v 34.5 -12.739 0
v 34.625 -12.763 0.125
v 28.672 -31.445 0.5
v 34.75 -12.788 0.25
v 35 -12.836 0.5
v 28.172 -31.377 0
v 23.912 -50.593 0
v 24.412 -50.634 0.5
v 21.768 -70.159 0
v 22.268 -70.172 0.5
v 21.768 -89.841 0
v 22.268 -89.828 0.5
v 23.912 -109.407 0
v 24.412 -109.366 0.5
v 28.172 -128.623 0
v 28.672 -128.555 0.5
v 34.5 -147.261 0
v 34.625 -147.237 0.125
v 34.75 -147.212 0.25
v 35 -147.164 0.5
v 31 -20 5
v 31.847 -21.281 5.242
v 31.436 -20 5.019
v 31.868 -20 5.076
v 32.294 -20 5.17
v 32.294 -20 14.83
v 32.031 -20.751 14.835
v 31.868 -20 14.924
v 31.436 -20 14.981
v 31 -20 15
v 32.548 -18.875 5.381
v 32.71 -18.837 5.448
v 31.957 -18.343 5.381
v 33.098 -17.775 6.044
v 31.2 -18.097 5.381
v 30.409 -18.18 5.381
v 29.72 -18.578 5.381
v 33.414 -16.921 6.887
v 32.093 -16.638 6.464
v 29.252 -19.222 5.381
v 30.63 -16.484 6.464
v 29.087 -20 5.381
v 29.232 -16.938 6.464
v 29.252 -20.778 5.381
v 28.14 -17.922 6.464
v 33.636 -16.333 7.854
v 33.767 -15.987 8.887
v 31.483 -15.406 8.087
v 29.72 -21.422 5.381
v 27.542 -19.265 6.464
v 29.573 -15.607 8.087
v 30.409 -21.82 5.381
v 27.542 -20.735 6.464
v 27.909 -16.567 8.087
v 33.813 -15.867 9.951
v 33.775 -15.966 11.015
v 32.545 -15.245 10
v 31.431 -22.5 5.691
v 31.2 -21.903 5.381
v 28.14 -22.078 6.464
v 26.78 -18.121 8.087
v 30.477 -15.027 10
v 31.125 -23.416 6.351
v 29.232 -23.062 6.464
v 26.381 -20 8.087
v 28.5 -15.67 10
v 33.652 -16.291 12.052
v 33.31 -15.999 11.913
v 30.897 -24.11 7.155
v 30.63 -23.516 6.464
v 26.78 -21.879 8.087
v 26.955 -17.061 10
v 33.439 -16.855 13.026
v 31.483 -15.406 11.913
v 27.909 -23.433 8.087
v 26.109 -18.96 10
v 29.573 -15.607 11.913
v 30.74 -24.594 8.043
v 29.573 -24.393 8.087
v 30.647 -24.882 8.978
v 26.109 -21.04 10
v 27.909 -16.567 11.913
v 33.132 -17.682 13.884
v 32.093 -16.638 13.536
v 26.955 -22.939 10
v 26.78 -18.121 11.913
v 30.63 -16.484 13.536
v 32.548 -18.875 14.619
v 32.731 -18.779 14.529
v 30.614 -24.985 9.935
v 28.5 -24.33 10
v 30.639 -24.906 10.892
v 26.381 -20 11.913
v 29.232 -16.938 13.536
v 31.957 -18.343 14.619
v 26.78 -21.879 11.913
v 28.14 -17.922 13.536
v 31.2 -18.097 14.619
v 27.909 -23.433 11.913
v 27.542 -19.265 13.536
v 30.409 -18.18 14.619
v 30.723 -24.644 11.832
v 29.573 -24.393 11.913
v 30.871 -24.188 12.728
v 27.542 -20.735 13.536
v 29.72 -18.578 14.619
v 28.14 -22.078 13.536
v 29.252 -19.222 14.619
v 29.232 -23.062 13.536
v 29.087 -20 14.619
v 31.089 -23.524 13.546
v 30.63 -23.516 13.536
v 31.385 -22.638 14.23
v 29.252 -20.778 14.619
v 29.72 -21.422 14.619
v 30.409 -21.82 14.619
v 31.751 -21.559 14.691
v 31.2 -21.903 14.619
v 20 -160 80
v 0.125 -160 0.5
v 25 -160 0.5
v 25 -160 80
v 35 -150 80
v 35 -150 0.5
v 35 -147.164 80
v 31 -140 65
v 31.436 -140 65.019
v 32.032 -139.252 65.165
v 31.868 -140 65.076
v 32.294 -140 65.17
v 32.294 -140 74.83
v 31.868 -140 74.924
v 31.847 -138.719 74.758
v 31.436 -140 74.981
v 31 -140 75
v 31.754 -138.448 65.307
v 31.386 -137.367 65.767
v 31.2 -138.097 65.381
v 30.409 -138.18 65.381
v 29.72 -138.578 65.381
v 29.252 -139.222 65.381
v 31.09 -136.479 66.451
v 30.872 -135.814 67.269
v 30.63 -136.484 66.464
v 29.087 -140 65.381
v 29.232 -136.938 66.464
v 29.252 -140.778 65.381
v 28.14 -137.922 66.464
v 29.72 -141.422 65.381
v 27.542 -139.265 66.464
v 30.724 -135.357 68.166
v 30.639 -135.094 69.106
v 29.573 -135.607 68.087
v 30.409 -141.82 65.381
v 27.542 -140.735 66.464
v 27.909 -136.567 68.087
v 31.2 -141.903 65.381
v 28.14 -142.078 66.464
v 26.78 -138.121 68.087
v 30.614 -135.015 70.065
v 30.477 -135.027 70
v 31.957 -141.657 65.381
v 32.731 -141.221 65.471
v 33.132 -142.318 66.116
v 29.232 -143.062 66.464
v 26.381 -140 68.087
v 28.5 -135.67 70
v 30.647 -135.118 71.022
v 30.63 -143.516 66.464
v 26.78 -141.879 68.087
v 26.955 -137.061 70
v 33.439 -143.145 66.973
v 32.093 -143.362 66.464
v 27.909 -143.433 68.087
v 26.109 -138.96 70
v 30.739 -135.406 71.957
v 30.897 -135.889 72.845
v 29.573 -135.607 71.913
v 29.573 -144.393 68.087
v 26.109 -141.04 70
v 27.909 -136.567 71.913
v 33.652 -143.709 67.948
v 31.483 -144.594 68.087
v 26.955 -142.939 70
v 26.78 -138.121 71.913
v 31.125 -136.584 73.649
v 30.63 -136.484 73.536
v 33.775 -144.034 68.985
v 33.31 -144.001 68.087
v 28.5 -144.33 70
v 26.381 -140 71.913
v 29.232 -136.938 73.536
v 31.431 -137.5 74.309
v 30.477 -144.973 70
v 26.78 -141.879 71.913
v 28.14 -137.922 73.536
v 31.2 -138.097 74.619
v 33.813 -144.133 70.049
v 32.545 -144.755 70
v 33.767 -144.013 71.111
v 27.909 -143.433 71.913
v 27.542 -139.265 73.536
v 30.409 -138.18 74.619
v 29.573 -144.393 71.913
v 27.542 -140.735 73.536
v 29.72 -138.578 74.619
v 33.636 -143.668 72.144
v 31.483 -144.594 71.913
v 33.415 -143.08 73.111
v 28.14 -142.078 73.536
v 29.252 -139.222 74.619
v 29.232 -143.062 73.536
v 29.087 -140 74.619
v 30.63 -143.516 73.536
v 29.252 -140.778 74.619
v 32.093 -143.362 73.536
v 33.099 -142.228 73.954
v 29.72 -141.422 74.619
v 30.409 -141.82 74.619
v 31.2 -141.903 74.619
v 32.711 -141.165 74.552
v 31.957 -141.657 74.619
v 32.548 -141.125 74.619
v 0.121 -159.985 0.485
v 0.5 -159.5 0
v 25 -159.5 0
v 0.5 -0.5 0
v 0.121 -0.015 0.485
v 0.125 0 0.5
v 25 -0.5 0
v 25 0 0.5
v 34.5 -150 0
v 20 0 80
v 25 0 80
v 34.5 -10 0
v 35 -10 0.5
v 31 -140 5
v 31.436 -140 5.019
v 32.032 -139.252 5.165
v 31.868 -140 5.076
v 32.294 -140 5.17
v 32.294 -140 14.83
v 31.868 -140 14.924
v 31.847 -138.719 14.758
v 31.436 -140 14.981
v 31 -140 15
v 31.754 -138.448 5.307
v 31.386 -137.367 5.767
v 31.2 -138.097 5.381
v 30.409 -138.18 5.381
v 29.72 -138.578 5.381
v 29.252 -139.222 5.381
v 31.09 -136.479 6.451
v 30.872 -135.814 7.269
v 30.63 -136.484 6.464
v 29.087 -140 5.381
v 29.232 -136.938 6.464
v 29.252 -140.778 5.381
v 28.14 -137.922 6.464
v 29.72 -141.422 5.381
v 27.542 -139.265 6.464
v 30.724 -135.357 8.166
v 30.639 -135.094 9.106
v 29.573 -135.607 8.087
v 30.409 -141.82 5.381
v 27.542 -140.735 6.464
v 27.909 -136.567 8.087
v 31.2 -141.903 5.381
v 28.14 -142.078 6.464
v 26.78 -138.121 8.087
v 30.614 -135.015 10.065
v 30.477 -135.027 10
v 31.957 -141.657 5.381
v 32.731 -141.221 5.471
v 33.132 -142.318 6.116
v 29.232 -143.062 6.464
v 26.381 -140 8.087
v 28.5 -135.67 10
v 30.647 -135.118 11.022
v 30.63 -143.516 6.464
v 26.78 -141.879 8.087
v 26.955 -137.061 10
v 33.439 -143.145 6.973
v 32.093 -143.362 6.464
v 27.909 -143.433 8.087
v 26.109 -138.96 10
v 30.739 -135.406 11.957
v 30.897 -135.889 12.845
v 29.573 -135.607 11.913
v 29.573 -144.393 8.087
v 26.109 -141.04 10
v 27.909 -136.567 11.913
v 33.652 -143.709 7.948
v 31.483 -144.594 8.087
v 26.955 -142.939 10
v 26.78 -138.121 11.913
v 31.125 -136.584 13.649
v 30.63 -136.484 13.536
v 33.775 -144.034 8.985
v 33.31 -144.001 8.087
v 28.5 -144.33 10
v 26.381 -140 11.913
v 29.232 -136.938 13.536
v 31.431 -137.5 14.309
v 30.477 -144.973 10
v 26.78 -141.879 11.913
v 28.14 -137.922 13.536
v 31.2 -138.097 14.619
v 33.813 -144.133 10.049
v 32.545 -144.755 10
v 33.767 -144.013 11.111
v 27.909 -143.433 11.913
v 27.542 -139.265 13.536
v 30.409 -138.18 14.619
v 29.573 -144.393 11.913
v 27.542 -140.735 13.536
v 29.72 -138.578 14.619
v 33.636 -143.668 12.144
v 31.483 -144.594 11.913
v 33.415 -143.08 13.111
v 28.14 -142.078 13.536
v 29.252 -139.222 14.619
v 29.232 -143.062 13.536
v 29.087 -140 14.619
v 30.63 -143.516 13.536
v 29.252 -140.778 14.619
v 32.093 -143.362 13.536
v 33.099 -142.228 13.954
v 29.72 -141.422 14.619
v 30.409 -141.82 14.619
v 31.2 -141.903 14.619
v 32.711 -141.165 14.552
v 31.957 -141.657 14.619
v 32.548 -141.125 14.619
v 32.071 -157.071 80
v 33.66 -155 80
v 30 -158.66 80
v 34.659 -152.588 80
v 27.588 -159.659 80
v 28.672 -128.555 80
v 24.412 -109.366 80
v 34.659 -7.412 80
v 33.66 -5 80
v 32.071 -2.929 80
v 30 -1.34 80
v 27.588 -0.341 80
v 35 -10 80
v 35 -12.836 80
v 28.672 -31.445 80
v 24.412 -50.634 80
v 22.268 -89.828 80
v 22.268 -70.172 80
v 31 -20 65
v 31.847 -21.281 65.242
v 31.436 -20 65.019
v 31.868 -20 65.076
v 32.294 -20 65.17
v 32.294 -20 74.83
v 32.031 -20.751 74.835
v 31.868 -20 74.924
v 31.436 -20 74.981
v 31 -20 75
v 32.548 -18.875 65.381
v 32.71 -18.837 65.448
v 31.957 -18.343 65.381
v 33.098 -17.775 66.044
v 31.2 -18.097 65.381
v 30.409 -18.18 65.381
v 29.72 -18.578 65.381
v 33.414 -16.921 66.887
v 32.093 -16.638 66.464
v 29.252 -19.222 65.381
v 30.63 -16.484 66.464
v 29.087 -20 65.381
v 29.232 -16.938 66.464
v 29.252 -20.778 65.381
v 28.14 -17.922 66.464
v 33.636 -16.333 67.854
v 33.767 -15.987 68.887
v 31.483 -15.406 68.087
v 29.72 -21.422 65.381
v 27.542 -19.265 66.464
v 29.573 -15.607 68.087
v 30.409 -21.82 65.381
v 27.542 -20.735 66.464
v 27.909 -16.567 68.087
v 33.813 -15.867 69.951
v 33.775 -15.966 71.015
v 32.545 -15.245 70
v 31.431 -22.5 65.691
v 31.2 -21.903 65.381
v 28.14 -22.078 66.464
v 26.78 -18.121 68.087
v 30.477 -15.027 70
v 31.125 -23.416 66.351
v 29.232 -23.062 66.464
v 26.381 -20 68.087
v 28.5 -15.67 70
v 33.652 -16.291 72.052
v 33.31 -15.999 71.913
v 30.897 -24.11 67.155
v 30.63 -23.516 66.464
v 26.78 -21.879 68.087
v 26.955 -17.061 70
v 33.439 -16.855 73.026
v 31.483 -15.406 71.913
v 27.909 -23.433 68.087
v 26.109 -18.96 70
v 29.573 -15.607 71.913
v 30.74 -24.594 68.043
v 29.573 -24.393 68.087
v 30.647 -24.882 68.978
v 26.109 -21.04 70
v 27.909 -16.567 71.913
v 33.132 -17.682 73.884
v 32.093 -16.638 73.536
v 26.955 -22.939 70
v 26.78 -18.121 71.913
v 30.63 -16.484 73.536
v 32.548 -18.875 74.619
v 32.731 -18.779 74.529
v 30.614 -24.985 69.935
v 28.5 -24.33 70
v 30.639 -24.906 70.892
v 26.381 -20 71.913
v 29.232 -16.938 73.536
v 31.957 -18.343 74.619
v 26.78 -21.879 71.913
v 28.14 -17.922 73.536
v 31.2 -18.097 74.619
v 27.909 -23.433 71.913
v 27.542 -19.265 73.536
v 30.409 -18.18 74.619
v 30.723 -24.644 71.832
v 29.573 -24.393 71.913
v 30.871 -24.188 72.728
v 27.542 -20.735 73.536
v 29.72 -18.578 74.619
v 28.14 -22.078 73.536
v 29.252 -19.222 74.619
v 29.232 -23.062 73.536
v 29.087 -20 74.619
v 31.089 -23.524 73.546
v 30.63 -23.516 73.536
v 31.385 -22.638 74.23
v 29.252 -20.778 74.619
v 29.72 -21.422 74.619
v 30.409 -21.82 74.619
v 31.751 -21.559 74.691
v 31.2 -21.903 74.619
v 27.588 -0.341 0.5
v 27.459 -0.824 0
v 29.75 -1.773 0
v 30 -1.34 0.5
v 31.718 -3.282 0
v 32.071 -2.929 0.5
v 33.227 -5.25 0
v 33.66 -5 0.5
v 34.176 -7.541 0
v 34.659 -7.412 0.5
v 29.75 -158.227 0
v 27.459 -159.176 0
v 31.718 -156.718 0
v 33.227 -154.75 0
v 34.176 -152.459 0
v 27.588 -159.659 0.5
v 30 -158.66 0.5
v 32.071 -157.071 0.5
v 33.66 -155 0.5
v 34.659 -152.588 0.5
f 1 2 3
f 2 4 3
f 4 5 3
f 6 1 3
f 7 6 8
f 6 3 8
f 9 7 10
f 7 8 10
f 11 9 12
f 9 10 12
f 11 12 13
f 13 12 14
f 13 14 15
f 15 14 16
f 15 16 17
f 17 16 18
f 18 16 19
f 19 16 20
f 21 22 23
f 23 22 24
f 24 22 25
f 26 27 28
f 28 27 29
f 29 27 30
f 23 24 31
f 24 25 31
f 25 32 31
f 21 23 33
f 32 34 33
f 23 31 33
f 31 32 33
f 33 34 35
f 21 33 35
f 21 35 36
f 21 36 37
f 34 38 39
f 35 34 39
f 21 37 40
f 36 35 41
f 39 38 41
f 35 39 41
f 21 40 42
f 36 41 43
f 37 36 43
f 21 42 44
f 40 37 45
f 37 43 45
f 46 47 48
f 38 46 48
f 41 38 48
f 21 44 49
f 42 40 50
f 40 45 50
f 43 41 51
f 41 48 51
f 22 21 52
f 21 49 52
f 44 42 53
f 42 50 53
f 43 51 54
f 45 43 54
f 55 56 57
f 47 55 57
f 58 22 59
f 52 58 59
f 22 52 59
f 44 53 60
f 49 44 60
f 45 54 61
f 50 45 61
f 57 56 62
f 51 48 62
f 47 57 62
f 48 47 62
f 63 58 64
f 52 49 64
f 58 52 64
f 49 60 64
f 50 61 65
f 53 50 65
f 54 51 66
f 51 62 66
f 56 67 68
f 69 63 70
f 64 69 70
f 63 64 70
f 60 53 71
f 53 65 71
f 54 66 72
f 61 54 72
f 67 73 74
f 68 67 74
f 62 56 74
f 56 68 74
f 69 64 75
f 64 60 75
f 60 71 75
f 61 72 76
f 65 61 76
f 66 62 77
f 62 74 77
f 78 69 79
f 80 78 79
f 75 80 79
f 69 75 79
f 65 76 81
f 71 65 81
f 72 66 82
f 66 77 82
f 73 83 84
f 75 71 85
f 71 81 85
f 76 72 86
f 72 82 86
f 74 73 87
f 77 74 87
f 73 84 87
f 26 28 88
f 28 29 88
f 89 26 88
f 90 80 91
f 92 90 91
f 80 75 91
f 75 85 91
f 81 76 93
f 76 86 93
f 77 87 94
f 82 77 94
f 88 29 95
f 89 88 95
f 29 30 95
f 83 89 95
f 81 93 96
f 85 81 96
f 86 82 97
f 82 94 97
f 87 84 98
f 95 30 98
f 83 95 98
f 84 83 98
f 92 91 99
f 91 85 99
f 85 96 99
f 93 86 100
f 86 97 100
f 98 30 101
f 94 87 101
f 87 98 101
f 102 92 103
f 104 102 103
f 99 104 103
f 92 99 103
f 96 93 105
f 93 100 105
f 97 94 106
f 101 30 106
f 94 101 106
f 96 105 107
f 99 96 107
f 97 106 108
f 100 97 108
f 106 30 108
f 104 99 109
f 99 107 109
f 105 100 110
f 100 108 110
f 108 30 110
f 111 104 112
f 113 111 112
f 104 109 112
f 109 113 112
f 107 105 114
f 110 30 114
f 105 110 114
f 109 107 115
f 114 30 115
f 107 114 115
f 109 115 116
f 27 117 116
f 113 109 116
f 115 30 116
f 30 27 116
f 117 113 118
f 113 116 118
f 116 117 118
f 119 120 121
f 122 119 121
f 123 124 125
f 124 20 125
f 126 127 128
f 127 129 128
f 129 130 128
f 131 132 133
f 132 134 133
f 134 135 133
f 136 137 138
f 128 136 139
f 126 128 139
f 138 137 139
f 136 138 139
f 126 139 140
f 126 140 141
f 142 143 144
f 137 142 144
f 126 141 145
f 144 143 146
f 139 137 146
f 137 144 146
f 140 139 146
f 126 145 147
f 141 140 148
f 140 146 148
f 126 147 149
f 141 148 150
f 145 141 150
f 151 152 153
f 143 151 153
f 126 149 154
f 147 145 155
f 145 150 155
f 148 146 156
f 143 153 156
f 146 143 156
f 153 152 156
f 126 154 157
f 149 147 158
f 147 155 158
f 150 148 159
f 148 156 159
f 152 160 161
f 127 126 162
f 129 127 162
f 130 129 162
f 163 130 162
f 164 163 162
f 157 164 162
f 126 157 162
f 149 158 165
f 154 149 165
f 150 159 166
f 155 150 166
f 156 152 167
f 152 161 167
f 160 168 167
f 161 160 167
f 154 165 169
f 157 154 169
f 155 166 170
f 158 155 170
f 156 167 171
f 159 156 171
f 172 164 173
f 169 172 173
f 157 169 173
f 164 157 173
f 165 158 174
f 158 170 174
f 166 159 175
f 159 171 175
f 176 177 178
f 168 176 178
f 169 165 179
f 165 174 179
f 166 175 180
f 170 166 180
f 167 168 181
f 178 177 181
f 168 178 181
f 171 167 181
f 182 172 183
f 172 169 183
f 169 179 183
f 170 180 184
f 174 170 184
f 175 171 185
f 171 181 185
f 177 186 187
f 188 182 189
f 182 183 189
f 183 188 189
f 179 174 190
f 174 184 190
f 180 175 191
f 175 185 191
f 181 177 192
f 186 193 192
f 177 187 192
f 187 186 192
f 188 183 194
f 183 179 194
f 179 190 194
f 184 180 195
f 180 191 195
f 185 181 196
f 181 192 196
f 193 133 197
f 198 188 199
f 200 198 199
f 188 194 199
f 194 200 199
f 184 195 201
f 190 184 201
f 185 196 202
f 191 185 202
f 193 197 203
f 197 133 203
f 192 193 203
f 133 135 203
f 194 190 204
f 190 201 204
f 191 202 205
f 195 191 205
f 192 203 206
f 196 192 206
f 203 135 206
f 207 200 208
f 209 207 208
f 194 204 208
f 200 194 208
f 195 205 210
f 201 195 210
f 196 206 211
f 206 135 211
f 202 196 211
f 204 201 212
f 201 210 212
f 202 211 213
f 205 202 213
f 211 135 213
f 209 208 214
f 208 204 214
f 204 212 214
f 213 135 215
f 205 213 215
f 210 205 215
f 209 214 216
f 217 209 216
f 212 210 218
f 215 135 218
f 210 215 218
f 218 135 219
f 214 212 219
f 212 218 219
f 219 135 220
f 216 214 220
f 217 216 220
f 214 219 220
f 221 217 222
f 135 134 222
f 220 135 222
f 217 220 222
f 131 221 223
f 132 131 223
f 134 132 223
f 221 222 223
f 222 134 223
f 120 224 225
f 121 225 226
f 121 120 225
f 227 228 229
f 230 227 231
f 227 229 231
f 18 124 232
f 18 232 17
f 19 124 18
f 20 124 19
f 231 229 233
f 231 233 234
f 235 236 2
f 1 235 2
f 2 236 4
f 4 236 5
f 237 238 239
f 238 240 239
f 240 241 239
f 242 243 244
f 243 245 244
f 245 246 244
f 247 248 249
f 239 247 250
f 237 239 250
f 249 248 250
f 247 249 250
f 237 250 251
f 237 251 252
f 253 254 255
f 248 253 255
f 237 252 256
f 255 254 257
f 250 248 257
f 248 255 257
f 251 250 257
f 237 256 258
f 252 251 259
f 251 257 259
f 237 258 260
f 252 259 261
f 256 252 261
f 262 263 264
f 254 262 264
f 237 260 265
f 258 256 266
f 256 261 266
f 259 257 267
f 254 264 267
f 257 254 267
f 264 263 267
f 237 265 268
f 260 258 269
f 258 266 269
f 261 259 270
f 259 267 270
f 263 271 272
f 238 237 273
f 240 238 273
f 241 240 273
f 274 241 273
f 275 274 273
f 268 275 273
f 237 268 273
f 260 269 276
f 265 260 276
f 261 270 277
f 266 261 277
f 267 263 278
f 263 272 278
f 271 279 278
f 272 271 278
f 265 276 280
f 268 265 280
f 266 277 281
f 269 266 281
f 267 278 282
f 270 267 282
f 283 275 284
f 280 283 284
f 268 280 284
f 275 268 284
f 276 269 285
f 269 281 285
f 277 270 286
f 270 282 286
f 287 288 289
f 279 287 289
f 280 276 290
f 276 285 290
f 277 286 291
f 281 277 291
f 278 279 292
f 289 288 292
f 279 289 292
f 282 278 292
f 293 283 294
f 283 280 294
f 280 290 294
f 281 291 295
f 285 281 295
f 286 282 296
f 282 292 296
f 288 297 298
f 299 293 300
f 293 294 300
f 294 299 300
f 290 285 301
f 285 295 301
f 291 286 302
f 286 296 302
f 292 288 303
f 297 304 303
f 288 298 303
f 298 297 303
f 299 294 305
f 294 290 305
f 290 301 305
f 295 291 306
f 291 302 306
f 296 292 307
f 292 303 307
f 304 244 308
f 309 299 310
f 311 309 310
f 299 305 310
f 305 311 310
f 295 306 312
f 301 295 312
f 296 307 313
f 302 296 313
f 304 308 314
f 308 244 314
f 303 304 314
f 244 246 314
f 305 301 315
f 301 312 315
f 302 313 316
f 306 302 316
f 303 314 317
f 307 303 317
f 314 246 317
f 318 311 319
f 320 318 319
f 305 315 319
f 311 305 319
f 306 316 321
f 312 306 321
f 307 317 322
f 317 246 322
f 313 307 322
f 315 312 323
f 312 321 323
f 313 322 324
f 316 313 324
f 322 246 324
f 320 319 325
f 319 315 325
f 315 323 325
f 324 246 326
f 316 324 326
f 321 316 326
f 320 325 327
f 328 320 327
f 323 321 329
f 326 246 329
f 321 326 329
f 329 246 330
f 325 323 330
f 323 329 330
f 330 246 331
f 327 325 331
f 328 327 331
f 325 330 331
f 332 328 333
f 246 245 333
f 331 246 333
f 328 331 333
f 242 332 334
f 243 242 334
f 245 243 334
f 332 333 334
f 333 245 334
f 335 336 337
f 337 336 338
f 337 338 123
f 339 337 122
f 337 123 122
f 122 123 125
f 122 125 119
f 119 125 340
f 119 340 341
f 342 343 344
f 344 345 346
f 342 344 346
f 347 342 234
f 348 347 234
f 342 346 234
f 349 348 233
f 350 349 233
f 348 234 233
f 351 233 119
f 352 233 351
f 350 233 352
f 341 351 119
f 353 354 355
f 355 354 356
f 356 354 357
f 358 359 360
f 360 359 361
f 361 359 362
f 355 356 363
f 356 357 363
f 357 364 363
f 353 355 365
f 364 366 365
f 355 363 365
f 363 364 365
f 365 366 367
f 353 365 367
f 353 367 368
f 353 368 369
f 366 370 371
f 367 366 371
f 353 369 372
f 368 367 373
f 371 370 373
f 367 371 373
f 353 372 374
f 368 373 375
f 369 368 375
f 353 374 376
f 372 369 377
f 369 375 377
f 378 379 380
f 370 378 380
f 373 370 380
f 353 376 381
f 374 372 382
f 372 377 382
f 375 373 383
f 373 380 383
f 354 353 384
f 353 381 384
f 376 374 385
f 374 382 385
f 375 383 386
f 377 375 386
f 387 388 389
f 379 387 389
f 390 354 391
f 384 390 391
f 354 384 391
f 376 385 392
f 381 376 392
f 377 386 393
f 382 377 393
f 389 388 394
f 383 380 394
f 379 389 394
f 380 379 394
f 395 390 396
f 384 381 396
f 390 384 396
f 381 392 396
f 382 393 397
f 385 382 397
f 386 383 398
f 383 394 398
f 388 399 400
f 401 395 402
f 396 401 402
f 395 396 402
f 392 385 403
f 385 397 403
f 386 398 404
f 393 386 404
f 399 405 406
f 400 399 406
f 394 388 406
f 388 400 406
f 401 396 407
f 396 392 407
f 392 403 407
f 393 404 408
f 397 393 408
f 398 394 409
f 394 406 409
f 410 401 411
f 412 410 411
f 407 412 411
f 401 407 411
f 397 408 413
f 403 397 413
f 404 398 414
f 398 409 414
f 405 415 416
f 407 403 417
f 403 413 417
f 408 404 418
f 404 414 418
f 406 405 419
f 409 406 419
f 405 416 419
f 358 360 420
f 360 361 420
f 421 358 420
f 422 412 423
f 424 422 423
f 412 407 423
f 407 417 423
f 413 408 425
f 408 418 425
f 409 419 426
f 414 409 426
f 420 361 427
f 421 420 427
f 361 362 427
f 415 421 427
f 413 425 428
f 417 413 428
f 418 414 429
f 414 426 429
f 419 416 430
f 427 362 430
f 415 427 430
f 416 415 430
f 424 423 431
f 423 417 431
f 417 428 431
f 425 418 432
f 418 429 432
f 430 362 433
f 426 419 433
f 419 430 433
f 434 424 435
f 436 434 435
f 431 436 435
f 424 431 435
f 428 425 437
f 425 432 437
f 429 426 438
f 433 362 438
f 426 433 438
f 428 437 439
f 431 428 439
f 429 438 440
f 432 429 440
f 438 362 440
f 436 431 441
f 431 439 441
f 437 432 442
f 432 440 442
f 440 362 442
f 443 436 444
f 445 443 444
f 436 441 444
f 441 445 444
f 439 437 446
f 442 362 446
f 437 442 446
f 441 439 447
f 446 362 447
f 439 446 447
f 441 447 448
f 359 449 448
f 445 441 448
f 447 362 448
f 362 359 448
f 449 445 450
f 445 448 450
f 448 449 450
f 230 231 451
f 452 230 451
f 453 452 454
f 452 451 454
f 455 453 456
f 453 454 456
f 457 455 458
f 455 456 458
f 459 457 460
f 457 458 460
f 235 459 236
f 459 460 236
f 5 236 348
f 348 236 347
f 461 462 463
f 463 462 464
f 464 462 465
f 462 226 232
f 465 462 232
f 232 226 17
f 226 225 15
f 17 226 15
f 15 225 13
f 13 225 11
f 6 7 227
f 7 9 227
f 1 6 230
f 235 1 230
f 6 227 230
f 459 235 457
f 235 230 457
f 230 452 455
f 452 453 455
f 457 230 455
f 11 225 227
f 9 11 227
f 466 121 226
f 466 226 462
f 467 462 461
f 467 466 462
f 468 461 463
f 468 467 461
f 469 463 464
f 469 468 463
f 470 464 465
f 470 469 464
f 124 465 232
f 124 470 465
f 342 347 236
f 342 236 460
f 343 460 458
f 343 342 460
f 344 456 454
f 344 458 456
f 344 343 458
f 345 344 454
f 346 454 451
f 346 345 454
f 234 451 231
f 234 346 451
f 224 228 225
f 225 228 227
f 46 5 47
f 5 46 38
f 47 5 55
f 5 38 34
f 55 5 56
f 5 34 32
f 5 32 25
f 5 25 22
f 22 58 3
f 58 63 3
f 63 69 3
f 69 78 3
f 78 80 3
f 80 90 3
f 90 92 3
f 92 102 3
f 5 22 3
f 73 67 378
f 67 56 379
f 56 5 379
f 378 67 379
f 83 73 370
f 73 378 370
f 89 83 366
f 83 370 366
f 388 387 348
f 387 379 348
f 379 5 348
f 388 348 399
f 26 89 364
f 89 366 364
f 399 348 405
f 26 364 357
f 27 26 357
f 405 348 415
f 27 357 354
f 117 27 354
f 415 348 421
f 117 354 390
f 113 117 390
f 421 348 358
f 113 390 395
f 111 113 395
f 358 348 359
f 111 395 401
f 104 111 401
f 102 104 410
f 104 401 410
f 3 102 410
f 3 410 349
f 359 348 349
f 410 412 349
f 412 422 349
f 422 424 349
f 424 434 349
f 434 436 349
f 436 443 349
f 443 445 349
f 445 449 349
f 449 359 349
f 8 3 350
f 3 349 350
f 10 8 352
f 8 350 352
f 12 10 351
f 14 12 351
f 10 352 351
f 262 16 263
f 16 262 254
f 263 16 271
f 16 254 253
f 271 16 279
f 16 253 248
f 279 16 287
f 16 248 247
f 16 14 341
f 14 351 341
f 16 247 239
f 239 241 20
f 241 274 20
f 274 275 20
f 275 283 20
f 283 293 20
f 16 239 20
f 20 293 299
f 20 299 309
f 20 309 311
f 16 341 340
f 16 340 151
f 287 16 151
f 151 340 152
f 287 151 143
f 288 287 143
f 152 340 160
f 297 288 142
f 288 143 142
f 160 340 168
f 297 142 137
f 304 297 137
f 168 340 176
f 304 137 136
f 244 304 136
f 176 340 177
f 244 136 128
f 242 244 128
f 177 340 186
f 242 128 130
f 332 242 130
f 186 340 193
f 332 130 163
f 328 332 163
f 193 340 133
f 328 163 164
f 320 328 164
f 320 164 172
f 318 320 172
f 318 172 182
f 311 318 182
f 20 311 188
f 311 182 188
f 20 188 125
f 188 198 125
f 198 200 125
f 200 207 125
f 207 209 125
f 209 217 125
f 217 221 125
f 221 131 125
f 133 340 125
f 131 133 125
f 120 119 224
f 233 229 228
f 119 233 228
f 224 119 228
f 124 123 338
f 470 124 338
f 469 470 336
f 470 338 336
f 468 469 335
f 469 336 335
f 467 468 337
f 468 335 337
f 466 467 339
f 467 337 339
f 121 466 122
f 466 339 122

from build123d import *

# Parameters (mm, degrees)
PAD_DEPTH    = 160
SKETCH001_R  = 180
POCKET_DEPTH = 80.001
FILLET_R     = 10
CHAMFER_SIZE = 0.5


with BuildPart() as sph_re002:
    # Sphere002 → Sphere002 (revolve)
    with BuildSketch(Plane(origin=(31, -140, 10), x_dir=(1, 0, 0), z_dir=(0, -1, 0))):
        with BuildLine():
            ThreePointArc((0, -5), (5, 0), (0, 5))
            Line((0, 5), (0, -5))
        make_face()
    revolve(axis=Axis((31, -140, 10), (0, 0, 1)))


with BuildPart() as sph_re003:
    # Sphere003 → Sphere003 (revolve)
    with BuildSketch(Plane(origin=(31, -140, 70), x_dir=(1, 0, 0), z_dir=(0, -1, 0))):
        with BuildLine():
            ThreePointArc((0, -5), (5, 0), (0, 5))
            Line((0, 5), (0, -5))
        make_face()
    revolve(axis=Axis((31, -140, 70), (0, 0, 1)))


with BuildPart() as sph_re001:
    # Sphere001 → Sphere001 (revolve)
    with BuildSketch(Plane(origin=(31, -20, 70), x_dir=(1, 0, 0), z_dir=(0, -1, 0))):
        with BuildLine():
            ThreePointArc((0, -5), (5, 0), (0, 5))
            Line((0, 5), (0, -5))
        make_face()
    revolve(axis=Axis((31, -20, 70), (0, 0, 1)))


with BuildPart() as sph_re:
    # Sphere → Sphere (revolve)
    with BuildSketch(Plane(origin=(31, -20, 10), x_dir=(1, 0, 0), z_dir=(0, -1, 0))):
        with BuildLine():
            ThreePointArc((0, -5), (5, 0), (0, 5))
            Line((0, 5), (0, -5))
        make_face()
    revolve(axis=Axis((31, -20, 10), (0, 0, 1)))


with BuildPart() as chamfer_body:
    # Sketch → Pad (new body)
    with BuildSketch(Plane.XZ):
        Polygon((0, 0), (35, 0), (35, 80), (20, 80), align=None)
    extrude(amount=PAD_DEPTH)

    # Sketch001 → Pocket (cut, through all)
    with BuildSketch(Plane(origin=(0, 0, 80), x_dir=(-1, 0, 0), z_dir=(0, 0, 1))):
        with Locations((-202, 80)):
            Circle(SKETCH001_R)
    extrude(amount=-POCKET_DEPTH, mode=Mode.SUBTRACT)

    # Fillet
    fillet_edges = [chamfer_body.edges().sort_by_distance(p)[0] for p in [
        (35, 0, 40),
        (35, -160, 40),
    ]]
    fillet(fillet_edges, radius=FILLET_R)

    # Cut: cut Sphère
    add(sph_re.part, mode=Mode.SUBTRACT)

    # Cut001: cut Sphère001
    add(sph_re001.part, mode=Mode.SUBTRACT)

    # Cut002: cut Sphère003
    add(sph_re003.part, mode=Mode.SUBTRACT)

    # Cut003: cut Sphère002
    add(sph_re002.part, mode=Mode.SUBTRACT)

    # Chamfer
    chamfer_edges = [chamfer_body.edges().sort_by_distance(p)[0] for p in [
        (12.5, 0, 0),
        (32.071068, -2.928932, 0),
        (0, -80, 0),
        (35, -11.418011, 0),
        (12.5, -160, 0),
        (25.279882, -45.794737, 0),
        (32.071068, -157.071068, 0),
        (25.279882, -114.205263, 0),
        (35, -148.581989, 0),
    ]]
    chamfer(chamfer_edges, length=CHAMFER_SIZE)


solid = chamfer_body.part
